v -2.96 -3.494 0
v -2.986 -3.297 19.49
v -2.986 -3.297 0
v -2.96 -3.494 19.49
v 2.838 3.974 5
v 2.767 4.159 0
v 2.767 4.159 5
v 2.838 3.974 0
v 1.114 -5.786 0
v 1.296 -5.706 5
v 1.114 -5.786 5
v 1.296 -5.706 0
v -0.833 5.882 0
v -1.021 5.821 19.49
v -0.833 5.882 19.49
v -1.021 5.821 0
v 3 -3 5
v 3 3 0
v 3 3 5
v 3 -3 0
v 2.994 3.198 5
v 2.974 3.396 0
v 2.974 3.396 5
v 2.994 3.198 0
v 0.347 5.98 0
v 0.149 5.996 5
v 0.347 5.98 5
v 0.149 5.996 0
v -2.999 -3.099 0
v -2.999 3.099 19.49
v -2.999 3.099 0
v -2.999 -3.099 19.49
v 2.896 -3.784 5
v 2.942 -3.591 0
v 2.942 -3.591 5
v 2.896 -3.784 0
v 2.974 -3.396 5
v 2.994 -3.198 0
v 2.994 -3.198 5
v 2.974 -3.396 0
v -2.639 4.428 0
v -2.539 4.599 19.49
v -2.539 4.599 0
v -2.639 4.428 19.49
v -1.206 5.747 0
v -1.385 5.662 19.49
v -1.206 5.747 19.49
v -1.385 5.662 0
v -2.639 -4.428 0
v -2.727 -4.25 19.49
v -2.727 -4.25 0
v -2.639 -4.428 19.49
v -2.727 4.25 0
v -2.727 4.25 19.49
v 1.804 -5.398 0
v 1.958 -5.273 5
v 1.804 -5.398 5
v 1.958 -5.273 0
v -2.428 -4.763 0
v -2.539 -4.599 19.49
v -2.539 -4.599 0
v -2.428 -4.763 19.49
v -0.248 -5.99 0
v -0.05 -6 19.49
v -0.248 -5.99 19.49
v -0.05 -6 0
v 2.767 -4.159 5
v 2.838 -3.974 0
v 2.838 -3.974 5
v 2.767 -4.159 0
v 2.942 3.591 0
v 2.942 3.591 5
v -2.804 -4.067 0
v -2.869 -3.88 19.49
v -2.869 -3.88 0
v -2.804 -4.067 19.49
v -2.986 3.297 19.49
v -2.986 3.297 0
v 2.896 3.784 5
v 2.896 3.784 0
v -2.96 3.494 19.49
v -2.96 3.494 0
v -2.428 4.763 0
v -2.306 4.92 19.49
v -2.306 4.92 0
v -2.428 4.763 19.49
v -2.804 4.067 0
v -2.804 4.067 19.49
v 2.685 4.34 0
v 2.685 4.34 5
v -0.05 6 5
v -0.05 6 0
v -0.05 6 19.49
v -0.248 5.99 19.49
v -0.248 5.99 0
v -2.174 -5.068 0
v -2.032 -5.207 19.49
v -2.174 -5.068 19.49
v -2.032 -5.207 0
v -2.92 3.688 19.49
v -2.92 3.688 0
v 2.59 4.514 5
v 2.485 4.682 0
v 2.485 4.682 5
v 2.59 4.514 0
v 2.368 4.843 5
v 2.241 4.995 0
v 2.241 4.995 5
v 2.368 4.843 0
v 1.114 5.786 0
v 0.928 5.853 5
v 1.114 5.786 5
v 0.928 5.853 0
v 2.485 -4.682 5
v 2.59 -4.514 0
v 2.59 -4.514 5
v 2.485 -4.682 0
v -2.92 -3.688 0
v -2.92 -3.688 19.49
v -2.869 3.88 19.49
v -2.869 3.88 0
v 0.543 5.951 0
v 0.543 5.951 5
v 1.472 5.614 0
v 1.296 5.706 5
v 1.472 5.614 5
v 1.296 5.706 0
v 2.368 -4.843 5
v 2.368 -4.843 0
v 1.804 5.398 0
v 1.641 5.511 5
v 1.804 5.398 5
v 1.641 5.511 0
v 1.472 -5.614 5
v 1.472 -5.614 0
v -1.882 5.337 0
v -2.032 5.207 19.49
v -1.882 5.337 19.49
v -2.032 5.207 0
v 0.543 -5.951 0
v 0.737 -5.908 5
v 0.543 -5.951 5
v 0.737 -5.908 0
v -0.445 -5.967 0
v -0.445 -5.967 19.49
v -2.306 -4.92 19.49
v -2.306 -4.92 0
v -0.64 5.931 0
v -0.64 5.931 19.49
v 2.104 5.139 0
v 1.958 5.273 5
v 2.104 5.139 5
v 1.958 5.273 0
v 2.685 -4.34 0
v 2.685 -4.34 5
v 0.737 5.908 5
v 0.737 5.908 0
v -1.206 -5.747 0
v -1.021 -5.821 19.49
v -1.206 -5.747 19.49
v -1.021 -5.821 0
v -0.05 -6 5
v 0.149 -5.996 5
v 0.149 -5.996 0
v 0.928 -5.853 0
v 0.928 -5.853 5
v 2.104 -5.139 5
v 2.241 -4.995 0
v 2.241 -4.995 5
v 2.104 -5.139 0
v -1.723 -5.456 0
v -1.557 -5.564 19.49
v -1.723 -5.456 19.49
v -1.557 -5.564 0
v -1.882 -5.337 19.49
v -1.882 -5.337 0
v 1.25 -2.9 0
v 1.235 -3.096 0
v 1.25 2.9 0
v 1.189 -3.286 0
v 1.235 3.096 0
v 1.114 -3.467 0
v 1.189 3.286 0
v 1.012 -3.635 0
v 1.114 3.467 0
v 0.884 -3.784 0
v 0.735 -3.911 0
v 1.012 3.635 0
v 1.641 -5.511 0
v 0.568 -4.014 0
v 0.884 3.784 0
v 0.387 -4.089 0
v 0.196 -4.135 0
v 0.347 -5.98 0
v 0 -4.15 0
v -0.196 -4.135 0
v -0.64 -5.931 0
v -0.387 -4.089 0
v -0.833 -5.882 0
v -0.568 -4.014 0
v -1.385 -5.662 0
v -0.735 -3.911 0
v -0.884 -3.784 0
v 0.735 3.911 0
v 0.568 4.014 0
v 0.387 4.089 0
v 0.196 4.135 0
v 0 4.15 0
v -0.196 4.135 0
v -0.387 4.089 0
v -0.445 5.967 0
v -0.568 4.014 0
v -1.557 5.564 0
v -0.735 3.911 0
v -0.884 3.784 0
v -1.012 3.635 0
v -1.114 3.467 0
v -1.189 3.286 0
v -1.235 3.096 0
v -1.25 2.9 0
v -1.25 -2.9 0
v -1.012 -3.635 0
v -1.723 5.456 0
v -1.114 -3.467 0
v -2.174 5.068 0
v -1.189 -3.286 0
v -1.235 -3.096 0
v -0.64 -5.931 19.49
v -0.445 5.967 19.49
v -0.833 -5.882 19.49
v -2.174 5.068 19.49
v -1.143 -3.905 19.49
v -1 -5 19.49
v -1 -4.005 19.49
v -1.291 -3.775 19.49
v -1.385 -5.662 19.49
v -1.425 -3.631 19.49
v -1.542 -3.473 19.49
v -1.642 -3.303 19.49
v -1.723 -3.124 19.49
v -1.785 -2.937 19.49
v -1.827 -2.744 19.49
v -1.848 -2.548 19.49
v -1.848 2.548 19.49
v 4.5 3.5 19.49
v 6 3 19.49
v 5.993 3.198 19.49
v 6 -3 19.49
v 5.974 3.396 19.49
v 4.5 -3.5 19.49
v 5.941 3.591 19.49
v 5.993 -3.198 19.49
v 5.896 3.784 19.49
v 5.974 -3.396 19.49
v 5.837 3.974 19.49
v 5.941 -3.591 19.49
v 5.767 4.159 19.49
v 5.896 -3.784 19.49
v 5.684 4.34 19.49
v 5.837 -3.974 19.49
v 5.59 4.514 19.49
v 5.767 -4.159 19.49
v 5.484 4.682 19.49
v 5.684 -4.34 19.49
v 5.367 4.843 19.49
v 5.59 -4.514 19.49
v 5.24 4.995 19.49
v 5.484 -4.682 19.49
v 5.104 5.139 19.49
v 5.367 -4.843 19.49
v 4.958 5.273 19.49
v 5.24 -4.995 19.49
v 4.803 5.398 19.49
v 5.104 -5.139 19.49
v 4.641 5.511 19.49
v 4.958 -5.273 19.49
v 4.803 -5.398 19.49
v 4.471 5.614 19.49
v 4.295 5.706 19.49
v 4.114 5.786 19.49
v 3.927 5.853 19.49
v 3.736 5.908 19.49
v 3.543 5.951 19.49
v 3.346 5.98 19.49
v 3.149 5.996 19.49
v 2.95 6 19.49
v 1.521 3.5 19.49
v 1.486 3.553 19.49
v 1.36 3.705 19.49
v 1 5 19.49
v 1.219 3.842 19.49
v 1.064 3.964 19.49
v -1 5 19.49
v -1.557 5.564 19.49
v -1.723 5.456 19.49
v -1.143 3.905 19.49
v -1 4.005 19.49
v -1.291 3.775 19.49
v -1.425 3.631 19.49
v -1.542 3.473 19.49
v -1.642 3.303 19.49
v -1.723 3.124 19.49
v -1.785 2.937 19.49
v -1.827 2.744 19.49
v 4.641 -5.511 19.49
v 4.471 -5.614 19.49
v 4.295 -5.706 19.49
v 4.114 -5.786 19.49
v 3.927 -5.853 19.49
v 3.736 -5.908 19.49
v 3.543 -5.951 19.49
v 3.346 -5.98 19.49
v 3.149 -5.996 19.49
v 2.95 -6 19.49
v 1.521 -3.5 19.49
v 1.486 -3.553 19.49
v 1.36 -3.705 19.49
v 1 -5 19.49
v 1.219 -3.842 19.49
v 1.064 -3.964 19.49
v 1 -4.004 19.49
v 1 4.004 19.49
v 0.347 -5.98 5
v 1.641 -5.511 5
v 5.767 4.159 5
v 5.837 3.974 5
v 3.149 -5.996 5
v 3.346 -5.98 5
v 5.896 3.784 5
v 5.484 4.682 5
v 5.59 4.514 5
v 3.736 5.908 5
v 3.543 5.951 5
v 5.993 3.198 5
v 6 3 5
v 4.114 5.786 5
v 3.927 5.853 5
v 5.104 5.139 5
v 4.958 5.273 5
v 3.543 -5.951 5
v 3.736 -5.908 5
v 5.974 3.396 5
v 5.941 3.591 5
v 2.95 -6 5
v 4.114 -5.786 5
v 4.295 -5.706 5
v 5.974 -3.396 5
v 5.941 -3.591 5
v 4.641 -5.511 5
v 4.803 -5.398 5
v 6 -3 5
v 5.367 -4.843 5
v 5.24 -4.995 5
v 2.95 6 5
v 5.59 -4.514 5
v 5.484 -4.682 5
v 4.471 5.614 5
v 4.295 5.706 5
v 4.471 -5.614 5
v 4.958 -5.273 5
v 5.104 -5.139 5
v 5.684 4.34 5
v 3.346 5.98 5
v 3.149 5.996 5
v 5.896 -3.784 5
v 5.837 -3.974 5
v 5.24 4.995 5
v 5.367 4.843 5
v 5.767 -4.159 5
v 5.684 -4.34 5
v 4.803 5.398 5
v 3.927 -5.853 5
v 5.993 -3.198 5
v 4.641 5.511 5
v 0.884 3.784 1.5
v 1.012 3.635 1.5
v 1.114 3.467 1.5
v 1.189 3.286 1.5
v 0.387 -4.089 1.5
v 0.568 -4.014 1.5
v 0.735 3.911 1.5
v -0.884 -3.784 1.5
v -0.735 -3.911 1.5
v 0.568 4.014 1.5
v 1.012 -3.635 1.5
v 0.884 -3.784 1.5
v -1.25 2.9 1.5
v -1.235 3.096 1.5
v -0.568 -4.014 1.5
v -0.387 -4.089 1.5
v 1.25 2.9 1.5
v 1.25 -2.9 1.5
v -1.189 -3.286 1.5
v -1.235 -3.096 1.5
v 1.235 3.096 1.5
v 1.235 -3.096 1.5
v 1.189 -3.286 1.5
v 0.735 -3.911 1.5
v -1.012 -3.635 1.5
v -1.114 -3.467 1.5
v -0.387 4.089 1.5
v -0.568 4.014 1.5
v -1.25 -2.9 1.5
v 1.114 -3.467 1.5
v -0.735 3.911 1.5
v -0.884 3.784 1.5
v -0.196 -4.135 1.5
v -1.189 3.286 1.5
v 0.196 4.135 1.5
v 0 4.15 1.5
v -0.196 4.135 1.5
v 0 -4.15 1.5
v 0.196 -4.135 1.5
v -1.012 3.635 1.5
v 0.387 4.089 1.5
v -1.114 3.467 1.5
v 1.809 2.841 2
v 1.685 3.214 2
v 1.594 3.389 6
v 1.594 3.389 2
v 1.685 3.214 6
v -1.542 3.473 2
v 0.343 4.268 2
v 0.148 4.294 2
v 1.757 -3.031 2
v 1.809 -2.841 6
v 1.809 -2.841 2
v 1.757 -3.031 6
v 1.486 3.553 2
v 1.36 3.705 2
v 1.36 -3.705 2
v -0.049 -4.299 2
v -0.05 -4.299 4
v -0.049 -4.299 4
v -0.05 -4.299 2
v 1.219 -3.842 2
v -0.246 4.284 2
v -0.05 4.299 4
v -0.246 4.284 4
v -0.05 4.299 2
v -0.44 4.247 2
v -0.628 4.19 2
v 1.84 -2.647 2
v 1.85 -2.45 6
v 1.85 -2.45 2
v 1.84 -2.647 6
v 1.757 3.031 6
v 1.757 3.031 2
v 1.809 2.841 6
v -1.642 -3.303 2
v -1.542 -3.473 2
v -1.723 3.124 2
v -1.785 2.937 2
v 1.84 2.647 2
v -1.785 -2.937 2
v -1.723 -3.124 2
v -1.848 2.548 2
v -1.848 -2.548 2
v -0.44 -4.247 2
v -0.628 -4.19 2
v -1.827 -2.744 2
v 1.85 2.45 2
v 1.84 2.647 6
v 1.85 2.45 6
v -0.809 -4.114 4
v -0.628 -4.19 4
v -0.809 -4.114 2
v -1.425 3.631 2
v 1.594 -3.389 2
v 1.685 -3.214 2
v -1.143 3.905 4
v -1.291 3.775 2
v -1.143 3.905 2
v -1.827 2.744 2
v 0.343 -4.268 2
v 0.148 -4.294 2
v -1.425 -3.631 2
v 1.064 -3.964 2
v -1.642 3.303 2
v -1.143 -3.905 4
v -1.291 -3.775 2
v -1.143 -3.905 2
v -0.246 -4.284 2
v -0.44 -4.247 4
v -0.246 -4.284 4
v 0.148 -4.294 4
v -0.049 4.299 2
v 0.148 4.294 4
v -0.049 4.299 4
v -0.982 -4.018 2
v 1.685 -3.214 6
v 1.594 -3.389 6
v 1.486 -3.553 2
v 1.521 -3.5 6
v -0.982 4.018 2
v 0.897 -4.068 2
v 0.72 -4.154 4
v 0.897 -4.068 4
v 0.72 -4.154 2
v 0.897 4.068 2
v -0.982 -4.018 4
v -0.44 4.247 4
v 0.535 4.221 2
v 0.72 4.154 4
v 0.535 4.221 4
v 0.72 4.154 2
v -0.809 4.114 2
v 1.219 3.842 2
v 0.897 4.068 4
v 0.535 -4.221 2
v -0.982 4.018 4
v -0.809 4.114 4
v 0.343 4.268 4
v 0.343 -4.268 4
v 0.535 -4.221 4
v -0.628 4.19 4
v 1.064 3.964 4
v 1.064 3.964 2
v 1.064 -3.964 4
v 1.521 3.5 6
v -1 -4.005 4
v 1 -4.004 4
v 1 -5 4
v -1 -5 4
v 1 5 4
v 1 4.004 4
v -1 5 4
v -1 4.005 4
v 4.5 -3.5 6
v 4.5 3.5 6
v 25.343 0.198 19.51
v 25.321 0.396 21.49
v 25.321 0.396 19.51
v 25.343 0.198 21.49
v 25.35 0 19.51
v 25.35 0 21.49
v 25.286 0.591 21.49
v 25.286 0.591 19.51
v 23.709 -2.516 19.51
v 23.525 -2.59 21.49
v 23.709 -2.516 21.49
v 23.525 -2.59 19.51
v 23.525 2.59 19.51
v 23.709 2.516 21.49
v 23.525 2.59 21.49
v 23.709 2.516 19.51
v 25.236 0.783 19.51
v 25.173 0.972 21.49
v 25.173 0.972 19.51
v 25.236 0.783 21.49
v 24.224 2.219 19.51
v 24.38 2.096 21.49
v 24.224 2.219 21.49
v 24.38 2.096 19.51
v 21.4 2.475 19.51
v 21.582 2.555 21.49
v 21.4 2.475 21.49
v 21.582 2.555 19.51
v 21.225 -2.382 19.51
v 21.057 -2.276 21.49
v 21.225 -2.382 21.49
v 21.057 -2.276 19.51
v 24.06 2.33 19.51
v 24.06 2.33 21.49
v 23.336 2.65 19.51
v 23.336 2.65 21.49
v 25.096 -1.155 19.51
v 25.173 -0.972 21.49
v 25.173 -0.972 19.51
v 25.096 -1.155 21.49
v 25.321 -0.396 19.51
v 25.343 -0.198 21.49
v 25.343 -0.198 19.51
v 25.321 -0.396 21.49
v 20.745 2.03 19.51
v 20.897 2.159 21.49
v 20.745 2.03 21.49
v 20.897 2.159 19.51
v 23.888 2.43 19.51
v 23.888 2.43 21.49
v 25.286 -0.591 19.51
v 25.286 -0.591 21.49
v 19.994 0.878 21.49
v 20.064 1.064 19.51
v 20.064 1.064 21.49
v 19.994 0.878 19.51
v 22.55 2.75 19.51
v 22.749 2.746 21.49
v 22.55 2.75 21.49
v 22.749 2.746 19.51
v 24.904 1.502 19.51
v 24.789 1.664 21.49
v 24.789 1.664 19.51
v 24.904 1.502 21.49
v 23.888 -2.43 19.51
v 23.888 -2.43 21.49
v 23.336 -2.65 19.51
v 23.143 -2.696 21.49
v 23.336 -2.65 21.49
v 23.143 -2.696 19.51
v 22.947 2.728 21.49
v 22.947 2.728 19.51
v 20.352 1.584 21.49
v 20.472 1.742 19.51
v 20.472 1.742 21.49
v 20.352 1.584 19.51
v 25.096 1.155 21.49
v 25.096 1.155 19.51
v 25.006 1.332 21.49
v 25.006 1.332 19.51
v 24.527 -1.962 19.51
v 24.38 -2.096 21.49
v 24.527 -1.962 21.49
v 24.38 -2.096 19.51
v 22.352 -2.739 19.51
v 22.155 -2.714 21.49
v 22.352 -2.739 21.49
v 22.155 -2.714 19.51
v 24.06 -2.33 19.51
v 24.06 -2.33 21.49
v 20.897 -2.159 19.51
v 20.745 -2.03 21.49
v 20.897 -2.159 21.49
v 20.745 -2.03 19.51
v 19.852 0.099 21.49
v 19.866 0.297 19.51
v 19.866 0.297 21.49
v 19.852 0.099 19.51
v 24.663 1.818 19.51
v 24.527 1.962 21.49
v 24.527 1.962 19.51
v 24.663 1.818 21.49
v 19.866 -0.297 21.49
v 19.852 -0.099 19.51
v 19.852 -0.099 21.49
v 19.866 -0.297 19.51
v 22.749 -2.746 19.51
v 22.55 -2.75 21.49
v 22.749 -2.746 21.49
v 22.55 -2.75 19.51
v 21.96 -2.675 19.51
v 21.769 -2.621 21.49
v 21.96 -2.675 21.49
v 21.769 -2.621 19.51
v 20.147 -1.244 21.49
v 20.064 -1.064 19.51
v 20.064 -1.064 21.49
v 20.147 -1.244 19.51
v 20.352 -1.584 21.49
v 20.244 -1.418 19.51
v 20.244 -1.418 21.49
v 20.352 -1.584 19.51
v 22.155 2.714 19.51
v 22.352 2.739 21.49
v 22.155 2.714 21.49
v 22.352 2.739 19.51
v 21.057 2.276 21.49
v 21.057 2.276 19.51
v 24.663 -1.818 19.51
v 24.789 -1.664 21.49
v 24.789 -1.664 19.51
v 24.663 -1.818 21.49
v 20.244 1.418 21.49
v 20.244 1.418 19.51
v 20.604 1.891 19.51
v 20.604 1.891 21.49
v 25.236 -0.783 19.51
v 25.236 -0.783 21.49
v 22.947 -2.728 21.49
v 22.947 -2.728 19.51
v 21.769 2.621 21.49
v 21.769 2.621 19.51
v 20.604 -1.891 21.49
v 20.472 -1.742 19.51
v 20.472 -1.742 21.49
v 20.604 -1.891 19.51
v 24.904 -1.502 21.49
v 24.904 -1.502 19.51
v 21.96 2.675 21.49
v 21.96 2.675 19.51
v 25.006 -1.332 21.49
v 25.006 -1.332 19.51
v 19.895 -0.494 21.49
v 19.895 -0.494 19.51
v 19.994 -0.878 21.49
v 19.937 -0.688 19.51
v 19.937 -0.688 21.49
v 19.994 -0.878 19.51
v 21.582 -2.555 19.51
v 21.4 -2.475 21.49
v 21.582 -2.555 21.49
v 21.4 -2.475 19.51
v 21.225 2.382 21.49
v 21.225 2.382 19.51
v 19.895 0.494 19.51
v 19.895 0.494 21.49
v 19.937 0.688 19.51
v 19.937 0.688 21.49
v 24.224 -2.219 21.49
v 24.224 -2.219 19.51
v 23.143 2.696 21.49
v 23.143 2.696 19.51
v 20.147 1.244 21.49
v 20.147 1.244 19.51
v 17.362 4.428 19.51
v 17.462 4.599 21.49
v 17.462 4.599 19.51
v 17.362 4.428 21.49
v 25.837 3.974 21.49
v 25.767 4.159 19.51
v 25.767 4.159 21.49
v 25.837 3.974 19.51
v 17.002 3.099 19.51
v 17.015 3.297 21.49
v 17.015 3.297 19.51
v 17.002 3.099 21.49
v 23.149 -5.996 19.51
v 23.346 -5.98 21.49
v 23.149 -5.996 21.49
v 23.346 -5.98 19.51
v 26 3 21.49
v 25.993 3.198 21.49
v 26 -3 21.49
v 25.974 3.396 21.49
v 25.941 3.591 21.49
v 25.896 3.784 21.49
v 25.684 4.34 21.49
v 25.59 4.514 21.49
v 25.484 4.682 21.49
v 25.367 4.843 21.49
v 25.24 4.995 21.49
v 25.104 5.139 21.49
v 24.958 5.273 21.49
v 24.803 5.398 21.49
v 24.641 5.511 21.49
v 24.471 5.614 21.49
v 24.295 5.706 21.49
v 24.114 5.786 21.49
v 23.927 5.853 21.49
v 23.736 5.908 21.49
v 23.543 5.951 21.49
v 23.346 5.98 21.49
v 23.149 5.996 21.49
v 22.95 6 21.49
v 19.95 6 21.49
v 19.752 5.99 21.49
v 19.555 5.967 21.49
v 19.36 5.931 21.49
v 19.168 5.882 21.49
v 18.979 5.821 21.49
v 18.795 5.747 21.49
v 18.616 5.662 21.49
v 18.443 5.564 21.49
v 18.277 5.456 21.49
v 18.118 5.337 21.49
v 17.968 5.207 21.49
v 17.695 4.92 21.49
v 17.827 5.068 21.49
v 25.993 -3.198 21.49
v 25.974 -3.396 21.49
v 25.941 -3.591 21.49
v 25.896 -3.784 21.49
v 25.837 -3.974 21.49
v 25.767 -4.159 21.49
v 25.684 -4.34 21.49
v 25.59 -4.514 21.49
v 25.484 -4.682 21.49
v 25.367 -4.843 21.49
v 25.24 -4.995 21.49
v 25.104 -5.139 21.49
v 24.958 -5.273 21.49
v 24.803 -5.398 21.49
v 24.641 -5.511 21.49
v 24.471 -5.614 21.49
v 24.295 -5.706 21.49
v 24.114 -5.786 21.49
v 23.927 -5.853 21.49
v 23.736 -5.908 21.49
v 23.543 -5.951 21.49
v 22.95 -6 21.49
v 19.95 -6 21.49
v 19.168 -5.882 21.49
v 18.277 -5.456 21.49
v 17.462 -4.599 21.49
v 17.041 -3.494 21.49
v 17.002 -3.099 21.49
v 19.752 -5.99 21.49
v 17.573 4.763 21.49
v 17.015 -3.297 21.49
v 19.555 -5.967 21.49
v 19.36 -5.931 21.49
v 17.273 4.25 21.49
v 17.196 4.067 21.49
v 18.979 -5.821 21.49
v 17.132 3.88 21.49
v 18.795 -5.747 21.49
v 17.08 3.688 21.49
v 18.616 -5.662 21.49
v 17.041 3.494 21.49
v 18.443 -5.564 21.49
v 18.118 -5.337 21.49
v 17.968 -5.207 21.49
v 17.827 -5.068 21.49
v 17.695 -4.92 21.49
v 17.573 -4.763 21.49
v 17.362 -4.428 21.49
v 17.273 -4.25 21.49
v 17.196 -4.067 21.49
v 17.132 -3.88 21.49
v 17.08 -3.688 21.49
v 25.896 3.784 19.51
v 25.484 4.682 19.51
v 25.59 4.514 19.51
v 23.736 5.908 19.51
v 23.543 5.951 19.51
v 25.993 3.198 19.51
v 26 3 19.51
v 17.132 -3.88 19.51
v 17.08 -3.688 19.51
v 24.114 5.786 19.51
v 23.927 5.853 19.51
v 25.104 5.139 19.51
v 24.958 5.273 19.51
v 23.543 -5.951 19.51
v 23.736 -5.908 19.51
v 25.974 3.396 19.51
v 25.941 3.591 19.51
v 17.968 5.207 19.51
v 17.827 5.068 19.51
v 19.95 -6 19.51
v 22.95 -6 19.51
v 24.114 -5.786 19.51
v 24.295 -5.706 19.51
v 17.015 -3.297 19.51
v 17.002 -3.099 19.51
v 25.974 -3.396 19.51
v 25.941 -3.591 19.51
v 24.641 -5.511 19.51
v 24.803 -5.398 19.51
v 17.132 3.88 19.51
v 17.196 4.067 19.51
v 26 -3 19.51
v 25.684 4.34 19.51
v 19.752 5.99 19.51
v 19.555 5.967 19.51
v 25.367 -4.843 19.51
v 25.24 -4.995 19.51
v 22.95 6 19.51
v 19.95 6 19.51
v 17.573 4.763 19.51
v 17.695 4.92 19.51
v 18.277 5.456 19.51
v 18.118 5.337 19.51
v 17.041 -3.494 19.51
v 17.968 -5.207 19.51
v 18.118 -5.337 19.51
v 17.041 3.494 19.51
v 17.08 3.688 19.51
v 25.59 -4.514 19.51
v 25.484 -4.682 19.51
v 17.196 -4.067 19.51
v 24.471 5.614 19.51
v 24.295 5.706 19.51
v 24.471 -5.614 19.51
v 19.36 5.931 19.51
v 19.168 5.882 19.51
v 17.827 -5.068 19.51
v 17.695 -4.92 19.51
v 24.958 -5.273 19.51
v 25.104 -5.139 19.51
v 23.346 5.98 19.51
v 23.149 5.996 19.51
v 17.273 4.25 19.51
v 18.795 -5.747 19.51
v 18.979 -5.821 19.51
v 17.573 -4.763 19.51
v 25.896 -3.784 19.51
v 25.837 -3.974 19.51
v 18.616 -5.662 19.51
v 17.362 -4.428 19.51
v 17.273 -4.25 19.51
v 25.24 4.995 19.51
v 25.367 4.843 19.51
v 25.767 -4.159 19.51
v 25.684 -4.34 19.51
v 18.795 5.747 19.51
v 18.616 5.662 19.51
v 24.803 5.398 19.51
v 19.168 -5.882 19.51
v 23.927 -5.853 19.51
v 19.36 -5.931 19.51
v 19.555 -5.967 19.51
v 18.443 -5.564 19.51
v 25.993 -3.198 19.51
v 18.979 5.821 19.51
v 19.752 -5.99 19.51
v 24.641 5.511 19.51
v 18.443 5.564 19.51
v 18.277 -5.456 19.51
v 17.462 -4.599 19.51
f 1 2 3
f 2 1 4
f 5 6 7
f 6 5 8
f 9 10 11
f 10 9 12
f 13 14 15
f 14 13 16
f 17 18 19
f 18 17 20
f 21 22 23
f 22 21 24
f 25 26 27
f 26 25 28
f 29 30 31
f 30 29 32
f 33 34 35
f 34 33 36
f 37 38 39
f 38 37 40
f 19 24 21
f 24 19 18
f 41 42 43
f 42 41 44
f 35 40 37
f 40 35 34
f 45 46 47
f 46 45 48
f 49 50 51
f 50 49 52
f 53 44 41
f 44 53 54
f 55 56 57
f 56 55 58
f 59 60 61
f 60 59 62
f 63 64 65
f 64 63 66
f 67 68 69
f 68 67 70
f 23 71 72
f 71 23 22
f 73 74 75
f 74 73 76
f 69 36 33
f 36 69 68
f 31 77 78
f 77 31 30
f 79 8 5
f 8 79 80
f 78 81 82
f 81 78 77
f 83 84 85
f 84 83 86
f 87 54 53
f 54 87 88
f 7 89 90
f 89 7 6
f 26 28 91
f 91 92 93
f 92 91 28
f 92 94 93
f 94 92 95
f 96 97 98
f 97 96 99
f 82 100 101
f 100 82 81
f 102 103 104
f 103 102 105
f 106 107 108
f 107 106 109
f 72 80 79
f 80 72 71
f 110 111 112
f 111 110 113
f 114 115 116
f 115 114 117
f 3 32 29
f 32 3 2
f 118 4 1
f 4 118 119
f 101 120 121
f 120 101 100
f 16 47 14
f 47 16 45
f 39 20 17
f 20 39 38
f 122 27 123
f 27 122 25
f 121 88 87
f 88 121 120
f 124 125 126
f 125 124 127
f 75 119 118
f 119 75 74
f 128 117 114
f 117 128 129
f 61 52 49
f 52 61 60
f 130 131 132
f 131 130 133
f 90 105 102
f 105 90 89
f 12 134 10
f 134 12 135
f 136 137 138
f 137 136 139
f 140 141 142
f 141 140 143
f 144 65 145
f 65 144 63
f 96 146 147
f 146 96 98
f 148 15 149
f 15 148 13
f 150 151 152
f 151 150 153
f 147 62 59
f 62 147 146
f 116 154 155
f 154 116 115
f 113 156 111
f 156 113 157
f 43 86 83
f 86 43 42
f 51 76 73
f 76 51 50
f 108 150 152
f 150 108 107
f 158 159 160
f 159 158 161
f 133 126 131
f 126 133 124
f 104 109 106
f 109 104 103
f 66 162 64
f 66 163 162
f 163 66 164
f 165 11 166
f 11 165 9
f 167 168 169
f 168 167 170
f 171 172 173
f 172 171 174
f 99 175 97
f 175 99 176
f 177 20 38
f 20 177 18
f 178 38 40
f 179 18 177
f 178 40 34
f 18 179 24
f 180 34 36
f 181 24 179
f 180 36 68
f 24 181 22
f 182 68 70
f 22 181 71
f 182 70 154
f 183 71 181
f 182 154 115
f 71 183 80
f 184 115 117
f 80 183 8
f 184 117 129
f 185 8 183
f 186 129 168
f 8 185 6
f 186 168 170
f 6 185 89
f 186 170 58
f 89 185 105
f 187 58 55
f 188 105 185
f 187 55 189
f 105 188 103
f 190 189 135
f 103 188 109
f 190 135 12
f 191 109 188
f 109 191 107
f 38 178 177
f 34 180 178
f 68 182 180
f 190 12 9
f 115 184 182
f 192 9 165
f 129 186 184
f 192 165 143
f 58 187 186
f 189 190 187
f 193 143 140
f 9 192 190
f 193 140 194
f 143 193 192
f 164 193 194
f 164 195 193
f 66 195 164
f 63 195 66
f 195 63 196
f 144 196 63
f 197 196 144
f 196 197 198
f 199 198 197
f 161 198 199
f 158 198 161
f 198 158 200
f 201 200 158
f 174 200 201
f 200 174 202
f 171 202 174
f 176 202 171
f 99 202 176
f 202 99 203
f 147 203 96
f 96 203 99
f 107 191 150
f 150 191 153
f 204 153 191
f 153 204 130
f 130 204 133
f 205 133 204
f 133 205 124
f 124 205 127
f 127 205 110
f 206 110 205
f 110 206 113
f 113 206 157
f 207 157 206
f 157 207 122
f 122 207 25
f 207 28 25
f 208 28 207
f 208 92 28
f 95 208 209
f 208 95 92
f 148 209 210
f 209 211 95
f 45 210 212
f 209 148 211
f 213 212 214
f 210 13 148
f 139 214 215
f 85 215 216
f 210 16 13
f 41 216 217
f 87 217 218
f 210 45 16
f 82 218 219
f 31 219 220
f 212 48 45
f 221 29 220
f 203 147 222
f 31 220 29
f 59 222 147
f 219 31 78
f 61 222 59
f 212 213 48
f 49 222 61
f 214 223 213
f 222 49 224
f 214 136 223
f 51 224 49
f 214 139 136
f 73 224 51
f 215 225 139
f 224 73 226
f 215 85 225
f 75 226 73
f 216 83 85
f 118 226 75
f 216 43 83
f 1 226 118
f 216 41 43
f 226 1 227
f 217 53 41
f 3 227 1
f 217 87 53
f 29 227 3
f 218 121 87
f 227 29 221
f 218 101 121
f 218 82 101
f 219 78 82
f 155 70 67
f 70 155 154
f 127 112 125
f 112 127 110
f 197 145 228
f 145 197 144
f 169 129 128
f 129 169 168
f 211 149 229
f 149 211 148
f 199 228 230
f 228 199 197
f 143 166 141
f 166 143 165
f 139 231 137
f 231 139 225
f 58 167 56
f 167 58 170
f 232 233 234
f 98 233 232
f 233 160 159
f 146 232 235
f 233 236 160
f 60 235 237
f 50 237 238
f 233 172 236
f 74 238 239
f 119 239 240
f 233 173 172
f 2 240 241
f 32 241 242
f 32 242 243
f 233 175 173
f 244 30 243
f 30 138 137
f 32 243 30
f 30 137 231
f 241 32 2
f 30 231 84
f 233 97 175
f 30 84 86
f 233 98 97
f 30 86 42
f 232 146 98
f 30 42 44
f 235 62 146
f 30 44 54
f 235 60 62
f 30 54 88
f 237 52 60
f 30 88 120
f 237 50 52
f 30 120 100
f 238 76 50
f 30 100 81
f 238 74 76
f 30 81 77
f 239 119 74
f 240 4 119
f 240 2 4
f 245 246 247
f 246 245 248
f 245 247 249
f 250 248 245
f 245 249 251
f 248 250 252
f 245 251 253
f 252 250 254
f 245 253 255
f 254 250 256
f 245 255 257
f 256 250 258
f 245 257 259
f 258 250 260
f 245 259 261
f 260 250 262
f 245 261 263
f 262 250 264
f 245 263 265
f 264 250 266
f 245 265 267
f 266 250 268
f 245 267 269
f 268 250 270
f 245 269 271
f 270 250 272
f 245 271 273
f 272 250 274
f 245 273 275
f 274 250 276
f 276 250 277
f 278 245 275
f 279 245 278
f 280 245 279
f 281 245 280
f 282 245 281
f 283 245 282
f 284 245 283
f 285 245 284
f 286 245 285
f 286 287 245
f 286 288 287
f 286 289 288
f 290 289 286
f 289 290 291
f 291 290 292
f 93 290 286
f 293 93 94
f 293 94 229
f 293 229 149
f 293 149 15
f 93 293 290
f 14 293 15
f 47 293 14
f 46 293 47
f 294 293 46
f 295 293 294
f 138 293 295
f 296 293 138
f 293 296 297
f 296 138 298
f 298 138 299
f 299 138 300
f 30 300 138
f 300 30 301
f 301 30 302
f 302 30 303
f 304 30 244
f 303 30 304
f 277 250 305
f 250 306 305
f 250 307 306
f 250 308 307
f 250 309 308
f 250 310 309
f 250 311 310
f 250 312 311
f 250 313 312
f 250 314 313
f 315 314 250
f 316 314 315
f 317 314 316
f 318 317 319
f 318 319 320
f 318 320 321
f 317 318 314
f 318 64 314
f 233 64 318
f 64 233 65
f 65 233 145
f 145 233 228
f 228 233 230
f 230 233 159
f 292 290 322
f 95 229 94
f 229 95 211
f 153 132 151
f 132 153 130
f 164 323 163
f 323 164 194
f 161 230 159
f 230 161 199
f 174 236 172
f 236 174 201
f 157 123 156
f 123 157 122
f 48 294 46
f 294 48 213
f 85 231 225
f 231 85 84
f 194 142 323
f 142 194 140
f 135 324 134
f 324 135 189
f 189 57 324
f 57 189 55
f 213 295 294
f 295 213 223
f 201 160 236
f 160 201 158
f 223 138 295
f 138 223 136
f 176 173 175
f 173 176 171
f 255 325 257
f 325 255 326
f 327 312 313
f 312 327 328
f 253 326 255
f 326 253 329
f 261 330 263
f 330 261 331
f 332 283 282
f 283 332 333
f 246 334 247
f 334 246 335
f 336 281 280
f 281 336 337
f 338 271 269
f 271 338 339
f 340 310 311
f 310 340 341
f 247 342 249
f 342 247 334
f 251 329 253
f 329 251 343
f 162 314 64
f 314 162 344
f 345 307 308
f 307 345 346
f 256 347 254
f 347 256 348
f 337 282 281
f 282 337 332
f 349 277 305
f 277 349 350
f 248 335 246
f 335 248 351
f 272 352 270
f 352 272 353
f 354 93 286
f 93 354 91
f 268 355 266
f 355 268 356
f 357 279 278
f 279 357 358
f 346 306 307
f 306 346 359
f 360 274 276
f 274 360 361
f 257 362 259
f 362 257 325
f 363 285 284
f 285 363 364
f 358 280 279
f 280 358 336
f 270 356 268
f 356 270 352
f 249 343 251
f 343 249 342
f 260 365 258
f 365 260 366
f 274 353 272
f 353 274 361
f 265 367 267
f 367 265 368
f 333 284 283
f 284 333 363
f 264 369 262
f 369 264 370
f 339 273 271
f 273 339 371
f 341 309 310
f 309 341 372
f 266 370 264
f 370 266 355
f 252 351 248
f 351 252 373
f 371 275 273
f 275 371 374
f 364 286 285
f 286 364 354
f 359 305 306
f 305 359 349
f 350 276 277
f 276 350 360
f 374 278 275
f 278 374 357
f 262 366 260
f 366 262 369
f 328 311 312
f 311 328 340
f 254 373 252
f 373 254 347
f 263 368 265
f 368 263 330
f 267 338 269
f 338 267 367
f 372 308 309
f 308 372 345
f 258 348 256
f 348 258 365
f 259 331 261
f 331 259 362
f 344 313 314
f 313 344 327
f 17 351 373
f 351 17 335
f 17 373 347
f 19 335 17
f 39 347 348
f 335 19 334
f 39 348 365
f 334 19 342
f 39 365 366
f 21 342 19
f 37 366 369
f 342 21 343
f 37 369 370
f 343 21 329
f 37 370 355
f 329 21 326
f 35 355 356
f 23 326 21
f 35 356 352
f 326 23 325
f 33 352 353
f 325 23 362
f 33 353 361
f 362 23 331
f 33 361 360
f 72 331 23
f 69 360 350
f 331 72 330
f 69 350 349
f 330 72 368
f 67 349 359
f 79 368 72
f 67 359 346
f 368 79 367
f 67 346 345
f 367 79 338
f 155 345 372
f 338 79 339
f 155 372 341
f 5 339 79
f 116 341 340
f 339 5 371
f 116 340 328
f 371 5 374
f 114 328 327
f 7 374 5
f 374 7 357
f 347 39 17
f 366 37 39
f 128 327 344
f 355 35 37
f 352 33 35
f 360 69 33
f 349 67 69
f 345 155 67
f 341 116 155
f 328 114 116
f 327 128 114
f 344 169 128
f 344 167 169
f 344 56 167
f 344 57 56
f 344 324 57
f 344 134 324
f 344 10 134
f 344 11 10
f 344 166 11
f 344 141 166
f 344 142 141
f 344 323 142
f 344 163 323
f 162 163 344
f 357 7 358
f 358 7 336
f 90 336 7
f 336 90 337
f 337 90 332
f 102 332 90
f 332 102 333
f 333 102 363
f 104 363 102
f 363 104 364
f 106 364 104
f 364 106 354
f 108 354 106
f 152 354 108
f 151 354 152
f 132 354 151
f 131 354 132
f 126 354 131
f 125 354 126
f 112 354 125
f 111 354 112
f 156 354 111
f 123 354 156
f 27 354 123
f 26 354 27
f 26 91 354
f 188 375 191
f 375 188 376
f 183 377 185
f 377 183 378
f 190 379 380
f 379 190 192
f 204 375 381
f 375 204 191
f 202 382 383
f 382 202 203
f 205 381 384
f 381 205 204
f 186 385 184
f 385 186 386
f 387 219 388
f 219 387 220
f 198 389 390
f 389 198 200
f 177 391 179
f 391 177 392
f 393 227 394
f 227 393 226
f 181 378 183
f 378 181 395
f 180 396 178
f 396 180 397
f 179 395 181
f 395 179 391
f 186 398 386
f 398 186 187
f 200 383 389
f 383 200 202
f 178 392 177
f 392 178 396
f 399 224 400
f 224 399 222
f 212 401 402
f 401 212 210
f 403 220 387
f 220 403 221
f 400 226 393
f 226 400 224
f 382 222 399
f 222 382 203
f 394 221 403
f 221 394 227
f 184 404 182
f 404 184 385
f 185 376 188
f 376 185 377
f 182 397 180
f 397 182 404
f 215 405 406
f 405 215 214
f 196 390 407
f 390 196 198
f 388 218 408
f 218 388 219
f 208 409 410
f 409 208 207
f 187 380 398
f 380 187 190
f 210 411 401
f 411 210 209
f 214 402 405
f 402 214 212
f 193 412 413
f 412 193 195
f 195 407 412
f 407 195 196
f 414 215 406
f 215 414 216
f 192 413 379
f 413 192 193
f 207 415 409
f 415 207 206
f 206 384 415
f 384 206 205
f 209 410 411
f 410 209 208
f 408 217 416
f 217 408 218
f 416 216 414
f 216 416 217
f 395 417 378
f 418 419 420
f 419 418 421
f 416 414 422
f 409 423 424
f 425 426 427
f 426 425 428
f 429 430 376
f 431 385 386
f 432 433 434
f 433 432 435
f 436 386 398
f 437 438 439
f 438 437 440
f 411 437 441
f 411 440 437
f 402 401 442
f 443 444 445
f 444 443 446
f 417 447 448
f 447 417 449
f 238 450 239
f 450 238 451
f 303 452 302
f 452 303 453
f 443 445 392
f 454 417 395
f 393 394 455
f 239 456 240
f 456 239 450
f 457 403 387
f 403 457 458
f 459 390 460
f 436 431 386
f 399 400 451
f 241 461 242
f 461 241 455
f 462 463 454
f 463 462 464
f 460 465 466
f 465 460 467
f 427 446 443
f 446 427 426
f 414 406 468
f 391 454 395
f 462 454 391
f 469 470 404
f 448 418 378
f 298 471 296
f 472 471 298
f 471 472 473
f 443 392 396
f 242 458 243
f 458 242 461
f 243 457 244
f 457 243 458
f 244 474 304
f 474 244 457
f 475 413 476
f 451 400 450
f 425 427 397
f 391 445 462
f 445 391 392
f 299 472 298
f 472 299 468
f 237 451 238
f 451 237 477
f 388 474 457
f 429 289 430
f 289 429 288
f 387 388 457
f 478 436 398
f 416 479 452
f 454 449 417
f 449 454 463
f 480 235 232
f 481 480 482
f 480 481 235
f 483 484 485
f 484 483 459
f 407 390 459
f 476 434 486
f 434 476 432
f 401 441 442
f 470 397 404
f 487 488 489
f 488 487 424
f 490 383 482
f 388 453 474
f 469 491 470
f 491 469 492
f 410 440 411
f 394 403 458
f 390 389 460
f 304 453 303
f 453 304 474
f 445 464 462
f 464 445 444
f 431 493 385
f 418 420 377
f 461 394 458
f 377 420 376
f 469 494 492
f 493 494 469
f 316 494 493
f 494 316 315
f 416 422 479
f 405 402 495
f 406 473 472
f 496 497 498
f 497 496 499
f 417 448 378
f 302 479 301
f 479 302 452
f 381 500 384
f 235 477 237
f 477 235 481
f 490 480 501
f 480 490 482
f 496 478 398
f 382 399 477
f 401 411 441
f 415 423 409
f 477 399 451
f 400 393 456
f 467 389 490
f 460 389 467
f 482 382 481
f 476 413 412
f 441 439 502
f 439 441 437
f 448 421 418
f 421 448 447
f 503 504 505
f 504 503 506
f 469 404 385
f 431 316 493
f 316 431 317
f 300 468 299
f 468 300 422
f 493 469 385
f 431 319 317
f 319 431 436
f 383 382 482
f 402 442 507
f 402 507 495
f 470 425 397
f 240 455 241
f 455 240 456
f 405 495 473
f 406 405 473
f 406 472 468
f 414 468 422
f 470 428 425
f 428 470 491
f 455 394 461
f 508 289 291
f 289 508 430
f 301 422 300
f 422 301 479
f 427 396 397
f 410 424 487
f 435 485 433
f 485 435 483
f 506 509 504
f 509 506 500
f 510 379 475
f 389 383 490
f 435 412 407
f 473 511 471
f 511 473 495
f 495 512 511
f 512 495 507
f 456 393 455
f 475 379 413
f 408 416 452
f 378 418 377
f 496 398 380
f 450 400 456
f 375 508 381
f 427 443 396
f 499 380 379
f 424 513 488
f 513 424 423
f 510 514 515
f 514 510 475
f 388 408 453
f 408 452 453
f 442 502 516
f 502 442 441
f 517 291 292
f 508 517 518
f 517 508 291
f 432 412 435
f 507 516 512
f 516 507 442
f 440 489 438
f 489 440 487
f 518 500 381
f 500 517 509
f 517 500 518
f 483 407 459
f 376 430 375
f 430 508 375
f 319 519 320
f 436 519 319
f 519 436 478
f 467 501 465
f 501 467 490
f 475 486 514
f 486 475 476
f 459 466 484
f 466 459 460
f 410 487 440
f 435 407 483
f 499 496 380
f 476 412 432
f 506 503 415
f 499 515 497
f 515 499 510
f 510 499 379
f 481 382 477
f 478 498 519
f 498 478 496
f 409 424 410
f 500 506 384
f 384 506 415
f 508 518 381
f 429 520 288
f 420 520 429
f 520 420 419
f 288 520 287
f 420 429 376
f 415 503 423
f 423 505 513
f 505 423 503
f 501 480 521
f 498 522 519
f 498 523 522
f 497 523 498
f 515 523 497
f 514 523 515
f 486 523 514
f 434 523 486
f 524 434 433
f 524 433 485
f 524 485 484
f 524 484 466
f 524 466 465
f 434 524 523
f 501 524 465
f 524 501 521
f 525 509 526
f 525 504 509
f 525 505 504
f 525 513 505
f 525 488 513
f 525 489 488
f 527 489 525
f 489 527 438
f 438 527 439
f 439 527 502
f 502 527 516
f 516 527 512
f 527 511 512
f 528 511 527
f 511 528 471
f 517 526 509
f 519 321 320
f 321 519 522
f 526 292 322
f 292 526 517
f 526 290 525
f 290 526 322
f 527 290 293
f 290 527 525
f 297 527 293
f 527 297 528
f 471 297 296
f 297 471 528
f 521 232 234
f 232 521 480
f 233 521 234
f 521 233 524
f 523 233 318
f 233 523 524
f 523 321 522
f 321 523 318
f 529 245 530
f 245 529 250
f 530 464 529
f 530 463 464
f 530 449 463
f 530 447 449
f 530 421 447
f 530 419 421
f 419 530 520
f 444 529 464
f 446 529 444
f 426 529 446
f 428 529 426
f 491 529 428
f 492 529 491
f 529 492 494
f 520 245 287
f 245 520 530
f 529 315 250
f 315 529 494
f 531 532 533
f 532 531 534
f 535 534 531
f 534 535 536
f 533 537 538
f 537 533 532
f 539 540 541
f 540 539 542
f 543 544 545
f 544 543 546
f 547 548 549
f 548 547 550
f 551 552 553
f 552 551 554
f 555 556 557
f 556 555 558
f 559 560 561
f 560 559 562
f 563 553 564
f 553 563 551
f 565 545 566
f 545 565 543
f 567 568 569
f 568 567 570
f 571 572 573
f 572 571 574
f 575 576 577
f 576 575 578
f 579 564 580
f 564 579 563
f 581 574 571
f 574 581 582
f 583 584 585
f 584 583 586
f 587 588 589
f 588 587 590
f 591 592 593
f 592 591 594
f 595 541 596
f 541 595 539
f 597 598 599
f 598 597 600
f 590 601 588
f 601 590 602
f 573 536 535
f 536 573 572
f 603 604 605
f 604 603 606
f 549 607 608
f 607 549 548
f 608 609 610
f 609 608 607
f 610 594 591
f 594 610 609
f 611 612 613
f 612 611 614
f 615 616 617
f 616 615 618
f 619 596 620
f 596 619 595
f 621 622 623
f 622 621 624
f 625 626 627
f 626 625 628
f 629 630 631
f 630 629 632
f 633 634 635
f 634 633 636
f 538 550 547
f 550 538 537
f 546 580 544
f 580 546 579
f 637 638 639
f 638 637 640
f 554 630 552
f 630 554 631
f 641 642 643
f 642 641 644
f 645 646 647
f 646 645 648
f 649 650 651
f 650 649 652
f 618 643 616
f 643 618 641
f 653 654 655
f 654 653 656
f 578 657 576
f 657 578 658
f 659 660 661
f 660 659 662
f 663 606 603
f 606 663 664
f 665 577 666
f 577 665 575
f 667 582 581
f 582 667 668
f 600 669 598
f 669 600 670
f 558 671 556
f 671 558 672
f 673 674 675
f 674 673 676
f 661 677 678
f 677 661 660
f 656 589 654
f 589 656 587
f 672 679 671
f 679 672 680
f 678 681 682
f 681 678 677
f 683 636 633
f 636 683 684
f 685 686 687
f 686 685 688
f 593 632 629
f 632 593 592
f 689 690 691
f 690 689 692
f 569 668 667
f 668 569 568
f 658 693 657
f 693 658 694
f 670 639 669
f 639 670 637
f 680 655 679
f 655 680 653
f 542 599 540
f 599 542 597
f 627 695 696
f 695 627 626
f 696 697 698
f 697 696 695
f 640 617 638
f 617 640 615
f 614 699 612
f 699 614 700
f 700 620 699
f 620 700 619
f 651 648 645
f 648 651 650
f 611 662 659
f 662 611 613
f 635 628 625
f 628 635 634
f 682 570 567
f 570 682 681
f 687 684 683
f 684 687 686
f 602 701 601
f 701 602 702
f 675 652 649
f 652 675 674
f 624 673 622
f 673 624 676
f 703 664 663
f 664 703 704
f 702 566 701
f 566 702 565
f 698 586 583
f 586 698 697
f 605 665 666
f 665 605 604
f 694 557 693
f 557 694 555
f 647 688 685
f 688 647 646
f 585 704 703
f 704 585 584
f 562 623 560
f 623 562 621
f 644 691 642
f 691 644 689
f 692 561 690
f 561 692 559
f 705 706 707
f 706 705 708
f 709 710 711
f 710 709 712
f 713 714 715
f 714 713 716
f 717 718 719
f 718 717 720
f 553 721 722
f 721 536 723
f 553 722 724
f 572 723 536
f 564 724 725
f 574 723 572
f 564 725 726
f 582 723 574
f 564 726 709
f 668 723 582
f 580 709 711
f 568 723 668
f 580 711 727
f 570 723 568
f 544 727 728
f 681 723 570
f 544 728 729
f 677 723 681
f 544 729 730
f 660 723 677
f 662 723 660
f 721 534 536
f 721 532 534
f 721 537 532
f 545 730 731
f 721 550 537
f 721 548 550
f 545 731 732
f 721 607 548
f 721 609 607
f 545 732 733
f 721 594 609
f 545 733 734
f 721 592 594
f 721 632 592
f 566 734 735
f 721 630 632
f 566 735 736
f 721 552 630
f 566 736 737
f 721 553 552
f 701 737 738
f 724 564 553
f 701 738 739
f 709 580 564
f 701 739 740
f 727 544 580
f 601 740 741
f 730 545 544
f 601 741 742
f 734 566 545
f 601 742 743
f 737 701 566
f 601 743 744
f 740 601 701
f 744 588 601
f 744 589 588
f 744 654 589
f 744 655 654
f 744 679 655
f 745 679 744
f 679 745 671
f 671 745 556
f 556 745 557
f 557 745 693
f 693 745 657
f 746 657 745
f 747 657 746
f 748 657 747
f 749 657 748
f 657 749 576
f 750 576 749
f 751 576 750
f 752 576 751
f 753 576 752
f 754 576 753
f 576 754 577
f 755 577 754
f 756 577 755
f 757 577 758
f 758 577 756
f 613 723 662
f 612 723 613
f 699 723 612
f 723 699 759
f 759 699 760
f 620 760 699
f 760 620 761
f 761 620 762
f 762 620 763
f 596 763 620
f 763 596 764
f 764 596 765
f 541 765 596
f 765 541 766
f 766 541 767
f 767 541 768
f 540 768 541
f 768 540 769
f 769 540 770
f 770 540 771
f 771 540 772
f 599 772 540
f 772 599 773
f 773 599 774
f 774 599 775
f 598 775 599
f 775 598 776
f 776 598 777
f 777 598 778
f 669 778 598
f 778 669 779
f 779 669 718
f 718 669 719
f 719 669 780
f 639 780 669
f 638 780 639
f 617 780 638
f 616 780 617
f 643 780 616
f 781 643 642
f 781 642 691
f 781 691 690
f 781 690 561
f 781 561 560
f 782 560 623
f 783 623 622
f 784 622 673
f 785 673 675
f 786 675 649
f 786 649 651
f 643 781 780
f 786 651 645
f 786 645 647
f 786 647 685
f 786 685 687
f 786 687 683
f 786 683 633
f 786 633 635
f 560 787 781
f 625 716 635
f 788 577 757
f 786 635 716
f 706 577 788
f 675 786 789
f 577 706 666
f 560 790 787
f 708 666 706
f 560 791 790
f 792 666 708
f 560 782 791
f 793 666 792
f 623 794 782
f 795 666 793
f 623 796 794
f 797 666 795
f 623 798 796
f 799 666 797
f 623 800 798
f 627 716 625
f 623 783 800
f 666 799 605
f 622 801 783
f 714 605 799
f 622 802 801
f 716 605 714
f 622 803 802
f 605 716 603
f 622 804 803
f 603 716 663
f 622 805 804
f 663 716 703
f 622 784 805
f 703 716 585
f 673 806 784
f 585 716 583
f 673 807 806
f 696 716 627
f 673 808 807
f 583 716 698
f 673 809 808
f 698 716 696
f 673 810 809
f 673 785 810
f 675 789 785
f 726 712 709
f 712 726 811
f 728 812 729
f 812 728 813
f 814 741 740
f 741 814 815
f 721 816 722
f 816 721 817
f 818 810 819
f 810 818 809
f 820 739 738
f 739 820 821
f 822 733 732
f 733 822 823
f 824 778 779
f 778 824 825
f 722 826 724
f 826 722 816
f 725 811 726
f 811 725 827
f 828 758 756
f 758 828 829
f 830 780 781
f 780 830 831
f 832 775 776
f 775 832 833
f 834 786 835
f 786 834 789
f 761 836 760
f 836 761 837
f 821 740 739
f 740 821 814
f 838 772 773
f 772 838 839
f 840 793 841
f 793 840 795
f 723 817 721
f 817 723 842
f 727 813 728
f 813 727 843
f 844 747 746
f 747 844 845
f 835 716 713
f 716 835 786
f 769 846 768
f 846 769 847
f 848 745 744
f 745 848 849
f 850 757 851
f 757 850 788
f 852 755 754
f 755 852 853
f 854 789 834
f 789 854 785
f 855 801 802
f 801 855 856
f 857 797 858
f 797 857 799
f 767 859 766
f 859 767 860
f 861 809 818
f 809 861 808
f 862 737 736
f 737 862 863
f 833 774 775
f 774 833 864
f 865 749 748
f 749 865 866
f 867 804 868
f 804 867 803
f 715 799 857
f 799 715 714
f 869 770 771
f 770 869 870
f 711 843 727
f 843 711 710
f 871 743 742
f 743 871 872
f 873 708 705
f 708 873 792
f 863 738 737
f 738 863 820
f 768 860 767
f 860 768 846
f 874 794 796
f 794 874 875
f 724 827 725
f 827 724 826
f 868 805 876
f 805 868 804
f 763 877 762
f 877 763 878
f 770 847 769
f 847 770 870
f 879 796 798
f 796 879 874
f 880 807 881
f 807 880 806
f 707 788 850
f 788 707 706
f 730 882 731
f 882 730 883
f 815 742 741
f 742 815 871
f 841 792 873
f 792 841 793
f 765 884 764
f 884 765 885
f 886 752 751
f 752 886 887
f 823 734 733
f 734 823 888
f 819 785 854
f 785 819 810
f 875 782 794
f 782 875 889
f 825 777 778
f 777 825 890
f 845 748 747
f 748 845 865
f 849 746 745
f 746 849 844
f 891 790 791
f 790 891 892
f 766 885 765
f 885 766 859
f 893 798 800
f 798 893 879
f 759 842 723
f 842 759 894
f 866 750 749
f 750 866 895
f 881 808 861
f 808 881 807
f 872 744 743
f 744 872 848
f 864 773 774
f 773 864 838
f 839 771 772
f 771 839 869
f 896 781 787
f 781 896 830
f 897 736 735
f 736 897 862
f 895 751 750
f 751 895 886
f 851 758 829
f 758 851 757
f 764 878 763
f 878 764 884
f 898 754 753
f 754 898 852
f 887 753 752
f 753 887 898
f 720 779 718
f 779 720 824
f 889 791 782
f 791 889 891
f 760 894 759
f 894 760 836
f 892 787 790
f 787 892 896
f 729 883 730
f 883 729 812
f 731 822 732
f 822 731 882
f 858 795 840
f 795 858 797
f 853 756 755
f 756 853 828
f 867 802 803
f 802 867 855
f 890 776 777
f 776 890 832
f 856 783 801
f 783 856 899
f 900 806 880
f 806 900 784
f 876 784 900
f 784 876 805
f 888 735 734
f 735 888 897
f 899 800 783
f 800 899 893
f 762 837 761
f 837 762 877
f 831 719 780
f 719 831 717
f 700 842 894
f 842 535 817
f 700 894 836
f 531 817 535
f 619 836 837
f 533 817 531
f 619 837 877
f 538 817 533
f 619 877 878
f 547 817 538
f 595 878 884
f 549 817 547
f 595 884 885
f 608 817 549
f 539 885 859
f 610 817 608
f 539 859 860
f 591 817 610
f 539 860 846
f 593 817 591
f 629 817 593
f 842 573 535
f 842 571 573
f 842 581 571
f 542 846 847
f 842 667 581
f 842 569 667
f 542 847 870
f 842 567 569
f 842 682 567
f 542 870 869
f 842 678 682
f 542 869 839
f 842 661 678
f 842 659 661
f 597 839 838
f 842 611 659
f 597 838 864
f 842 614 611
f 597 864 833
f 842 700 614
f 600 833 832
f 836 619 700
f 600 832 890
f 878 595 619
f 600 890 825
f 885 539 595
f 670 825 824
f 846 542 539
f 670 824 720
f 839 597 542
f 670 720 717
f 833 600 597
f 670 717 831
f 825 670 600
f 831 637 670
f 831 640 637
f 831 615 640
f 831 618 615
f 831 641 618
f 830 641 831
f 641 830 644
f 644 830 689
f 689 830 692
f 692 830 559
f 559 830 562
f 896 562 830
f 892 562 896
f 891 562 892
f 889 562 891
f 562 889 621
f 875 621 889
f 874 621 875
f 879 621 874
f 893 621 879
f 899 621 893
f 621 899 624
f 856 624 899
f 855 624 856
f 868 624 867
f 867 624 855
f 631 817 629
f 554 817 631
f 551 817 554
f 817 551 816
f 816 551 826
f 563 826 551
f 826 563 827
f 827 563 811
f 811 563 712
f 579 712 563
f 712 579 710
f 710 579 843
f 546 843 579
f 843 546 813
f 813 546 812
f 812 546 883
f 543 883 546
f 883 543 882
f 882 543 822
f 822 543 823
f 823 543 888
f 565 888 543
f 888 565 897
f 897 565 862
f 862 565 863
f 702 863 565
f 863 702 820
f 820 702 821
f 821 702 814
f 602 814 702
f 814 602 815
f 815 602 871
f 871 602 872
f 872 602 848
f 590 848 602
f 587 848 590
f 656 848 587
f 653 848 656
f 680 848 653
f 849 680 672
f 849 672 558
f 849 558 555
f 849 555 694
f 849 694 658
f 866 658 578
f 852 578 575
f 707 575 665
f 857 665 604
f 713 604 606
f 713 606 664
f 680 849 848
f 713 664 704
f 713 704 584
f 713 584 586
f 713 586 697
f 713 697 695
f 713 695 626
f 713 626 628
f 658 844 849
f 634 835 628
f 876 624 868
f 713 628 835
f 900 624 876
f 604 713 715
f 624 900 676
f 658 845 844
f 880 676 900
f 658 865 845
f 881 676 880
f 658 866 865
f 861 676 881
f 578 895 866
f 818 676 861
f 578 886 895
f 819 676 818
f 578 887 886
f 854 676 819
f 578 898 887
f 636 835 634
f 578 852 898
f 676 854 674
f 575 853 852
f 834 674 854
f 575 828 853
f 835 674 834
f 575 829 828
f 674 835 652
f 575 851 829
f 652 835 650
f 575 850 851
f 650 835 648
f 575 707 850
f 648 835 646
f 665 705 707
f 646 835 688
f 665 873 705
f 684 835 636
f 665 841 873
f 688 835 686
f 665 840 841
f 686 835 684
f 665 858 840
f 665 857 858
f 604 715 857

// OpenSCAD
// https://www.amazon.co.jp/dp/B0CZ455K2C
$fa=1;$fs=.2;
module rl(d,y,x=.001){
	minkowski(){circle(d=d);square([x,y-d],center=true);}
}

module plug(){
	translate([0,0,-6.5])linear_extrude(8.5)rl(2.5,8.3);
	hull(){
		translate([0,0,1.5])linear_extrude(1)rl(2.5,8.3);
		translate([0,0,2])linear_extrude(2.01)rl(3.7,8.6);
	}
}

module board(){
	translate([0,0,4])linear_extrude(15.5){
		square([2,10],center=true);
		rl(3.7,8.6);
	}
	translate([.8/2,-7/2,6])cube([4.5-.8/2,7,13.5]);
	translate([5.2/2,0,19.5])cylinder(d=5.5,h=2);
}

module out(){
	difference(){
		union(){
			linear_extrude(19.49)rl(6,12);
			translate([3/2,0,5])linear_extrude(14.49)rl(6,12,3);
		}
		plug();
		board();
	}
	%translate([10,0,0]){plug();board();}
	
	translate([20,0,0])difference(){
		translate([3/2,0,19.51])linear_extrude(1.98)rl(6,12,3);
		board();
	}
}

out();
